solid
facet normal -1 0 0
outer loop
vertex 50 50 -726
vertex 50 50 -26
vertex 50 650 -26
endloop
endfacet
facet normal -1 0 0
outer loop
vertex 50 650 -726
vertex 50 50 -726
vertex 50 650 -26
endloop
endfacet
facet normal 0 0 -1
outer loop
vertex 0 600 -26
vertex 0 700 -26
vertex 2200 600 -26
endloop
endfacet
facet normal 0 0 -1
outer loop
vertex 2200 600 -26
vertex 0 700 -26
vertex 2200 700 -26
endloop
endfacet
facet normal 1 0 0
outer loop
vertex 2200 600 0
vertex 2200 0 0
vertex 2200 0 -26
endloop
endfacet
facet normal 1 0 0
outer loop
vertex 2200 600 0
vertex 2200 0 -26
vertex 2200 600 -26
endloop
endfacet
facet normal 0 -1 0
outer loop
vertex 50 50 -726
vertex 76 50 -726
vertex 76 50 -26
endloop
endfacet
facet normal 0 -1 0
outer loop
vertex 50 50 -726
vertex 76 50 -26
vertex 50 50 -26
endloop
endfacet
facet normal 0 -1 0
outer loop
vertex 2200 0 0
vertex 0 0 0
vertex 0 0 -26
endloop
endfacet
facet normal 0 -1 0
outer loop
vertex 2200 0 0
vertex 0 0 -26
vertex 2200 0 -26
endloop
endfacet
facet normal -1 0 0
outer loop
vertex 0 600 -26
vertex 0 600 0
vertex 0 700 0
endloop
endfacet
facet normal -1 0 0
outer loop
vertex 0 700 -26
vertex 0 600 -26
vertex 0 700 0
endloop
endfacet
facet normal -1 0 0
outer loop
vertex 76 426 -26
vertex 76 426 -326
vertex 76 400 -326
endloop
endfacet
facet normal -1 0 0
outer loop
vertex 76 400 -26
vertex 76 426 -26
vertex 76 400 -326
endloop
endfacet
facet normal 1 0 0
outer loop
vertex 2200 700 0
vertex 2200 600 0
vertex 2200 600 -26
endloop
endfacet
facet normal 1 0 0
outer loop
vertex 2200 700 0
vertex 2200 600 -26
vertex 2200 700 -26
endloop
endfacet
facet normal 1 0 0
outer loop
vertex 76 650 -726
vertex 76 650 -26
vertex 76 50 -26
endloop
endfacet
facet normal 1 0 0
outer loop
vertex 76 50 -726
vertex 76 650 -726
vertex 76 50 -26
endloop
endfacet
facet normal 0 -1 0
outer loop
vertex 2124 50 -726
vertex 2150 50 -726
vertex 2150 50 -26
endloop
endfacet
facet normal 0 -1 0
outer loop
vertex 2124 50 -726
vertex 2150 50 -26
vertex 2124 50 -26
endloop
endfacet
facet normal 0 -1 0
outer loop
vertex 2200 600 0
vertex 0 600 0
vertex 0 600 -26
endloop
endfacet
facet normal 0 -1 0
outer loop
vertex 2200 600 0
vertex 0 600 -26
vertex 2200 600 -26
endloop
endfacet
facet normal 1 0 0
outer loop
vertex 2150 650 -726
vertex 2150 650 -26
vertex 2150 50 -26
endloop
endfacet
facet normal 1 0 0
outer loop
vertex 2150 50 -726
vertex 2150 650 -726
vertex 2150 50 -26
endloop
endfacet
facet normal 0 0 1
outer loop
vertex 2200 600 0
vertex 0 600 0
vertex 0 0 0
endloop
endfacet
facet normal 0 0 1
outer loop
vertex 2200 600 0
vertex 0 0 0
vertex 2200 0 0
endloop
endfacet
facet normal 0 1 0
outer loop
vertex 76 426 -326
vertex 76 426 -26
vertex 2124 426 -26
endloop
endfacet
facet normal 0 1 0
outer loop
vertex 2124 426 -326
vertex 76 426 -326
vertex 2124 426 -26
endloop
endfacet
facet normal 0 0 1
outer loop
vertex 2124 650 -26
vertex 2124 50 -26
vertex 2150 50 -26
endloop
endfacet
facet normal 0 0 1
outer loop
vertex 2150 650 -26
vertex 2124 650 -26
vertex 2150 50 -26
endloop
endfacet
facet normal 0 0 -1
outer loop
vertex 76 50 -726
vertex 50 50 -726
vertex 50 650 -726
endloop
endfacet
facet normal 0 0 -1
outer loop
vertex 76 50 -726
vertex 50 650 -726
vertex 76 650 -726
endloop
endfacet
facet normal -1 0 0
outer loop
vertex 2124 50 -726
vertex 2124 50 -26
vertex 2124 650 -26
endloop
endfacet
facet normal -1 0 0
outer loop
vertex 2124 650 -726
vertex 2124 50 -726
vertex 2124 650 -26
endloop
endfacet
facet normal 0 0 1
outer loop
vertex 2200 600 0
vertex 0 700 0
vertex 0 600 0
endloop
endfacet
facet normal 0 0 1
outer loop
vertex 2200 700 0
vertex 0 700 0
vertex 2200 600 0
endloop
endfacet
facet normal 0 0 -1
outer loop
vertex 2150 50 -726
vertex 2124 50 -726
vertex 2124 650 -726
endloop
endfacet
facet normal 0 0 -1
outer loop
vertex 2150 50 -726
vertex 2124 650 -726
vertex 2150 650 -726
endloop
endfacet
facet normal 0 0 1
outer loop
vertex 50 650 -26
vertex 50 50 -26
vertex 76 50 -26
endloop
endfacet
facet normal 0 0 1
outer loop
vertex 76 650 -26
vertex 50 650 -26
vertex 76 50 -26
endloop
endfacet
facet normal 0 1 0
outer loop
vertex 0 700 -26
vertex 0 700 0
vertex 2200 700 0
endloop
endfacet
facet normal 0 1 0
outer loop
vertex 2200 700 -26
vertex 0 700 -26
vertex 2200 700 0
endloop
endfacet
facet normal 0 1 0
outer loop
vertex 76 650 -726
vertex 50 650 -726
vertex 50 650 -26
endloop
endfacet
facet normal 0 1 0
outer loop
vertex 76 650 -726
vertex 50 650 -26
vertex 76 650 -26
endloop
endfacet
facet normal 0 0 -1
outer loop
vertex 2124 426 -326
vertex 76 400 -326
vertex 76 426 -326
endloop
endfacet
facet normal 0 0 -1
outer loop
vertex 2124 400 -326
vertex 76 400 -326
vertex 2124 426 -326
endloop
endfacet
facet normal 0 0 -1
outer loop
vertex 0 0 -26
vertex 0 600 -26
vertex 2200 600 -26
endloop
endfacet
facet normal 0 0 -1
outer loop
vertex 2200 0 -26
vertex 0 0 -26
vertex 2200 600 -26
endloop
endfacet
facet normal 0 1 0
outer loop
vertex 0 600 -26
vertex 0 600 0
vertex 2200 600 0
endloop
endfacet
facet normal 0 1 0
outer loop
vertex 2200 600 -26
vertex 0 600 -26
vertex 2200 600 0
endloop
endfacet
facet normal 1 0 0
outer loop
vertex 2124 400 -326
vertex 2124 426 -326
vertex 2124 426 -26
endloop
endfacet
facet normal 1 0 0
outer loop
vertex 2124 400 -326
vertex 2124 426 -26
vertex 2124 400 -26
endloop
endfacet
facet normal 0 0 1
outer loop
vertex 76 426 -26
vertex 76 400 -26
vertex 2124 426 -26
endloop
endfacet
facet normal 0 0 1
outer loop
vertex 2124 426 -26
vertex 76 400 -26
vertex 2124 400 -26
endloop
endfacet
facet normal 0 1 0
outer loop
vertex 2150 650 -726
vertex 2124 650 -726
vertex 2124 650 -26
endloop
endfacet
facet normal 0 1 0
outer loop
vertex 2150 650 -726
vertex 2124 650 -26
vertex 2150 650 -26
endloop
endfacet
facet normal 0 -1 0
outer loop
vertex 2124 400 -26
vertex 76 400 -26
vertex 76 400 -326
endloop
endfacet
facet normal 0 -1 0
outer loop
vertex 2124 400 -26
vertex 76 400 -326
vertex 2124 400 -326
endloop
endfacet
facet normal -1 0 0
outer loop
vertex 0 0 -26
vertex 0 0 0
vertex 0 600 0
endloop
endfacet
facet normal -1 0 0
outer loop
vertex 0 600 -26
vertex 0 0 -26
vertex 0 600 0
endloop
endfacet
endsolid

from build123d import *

# Parameters (mm, degrees)
F0_W     = 2200
F0_H     = 600
F1_DEPTH = 26
F0_H_2   = 100
F2_DEPTH = 26
F3_W     = 26
F3_H     = 50
F4_DEPTH = 700
F3_W_2   = 2048
F3_H_2   = 26
F5_DEPTH = 300


# Not quite as in the source:
# - a feature of the source that left no trace in its solid (it failed there, or was rolled back) is left out


with BuildPart() as f1:
    # F0 (on Top) → F1 (new body)
    with BuildSketch(Plane.XY):
        with Locations((1100, 300)):
            Rectangle(F0_W, F0_H)
    extrude(amount=-F1_DEPTH)


with BuildPart() as f2:
    # F0 (on Top) → F2 (new body)
    with BuildSketch(Plane.XY):
        with Locations((1100, 650)):
            Rectangle(F0_W, F0_H_2)
    extrude(amount=-F2_DEPTH)


with BuildPart() as f4:
    # F3 (on face) → F4 (new body)
    with BuildSketch(Plane(origin=(0, 0, -26), x_dir=(1, 0, 0), z_dir=(0, 0, -1))):
        Polygon((2124, -426), (2124, -600), (2150, -600), (2150, -50), (2124, -50), (2124, -400), align=None)
        with Locations((2137, -625)):
            Rectangle(F3_W, F3_H)
    extrude(amount=F4_DEPTH)


with BuildPart() as f4b:
    # F3 (on face) → F4, piece 2 (new body)
    with BuildSketch(Plane(origin=(0, 0, -26), x_dir=(1, 0, 0), z_dir=(0, 0, -1))):
        Polygon((50, -600), (76, -600), (76, -426), (76, -400), (76, -50), (50, -50), align=None)
        with Locations((63, -625)):
            Rectangle(F3_W, F3_H)
    extrude(amount=F4_DEPTH)


with BuildPart() as f5:
    # F3 (on face) → F5 (new body)
    with BuildSketch(Plane(origin=(0, 0, -26), x_dir=(1, 0, 0), z_dir=(0, 0, -1))):
        with Locations((1100, -413)):
            Rectangle(F3_W_2, F3_H_2)
    extrude(amount=F5_DEPTH)


solid = Compound([f1.part, f2.part, f4.part, f4b.part, f5.part])
